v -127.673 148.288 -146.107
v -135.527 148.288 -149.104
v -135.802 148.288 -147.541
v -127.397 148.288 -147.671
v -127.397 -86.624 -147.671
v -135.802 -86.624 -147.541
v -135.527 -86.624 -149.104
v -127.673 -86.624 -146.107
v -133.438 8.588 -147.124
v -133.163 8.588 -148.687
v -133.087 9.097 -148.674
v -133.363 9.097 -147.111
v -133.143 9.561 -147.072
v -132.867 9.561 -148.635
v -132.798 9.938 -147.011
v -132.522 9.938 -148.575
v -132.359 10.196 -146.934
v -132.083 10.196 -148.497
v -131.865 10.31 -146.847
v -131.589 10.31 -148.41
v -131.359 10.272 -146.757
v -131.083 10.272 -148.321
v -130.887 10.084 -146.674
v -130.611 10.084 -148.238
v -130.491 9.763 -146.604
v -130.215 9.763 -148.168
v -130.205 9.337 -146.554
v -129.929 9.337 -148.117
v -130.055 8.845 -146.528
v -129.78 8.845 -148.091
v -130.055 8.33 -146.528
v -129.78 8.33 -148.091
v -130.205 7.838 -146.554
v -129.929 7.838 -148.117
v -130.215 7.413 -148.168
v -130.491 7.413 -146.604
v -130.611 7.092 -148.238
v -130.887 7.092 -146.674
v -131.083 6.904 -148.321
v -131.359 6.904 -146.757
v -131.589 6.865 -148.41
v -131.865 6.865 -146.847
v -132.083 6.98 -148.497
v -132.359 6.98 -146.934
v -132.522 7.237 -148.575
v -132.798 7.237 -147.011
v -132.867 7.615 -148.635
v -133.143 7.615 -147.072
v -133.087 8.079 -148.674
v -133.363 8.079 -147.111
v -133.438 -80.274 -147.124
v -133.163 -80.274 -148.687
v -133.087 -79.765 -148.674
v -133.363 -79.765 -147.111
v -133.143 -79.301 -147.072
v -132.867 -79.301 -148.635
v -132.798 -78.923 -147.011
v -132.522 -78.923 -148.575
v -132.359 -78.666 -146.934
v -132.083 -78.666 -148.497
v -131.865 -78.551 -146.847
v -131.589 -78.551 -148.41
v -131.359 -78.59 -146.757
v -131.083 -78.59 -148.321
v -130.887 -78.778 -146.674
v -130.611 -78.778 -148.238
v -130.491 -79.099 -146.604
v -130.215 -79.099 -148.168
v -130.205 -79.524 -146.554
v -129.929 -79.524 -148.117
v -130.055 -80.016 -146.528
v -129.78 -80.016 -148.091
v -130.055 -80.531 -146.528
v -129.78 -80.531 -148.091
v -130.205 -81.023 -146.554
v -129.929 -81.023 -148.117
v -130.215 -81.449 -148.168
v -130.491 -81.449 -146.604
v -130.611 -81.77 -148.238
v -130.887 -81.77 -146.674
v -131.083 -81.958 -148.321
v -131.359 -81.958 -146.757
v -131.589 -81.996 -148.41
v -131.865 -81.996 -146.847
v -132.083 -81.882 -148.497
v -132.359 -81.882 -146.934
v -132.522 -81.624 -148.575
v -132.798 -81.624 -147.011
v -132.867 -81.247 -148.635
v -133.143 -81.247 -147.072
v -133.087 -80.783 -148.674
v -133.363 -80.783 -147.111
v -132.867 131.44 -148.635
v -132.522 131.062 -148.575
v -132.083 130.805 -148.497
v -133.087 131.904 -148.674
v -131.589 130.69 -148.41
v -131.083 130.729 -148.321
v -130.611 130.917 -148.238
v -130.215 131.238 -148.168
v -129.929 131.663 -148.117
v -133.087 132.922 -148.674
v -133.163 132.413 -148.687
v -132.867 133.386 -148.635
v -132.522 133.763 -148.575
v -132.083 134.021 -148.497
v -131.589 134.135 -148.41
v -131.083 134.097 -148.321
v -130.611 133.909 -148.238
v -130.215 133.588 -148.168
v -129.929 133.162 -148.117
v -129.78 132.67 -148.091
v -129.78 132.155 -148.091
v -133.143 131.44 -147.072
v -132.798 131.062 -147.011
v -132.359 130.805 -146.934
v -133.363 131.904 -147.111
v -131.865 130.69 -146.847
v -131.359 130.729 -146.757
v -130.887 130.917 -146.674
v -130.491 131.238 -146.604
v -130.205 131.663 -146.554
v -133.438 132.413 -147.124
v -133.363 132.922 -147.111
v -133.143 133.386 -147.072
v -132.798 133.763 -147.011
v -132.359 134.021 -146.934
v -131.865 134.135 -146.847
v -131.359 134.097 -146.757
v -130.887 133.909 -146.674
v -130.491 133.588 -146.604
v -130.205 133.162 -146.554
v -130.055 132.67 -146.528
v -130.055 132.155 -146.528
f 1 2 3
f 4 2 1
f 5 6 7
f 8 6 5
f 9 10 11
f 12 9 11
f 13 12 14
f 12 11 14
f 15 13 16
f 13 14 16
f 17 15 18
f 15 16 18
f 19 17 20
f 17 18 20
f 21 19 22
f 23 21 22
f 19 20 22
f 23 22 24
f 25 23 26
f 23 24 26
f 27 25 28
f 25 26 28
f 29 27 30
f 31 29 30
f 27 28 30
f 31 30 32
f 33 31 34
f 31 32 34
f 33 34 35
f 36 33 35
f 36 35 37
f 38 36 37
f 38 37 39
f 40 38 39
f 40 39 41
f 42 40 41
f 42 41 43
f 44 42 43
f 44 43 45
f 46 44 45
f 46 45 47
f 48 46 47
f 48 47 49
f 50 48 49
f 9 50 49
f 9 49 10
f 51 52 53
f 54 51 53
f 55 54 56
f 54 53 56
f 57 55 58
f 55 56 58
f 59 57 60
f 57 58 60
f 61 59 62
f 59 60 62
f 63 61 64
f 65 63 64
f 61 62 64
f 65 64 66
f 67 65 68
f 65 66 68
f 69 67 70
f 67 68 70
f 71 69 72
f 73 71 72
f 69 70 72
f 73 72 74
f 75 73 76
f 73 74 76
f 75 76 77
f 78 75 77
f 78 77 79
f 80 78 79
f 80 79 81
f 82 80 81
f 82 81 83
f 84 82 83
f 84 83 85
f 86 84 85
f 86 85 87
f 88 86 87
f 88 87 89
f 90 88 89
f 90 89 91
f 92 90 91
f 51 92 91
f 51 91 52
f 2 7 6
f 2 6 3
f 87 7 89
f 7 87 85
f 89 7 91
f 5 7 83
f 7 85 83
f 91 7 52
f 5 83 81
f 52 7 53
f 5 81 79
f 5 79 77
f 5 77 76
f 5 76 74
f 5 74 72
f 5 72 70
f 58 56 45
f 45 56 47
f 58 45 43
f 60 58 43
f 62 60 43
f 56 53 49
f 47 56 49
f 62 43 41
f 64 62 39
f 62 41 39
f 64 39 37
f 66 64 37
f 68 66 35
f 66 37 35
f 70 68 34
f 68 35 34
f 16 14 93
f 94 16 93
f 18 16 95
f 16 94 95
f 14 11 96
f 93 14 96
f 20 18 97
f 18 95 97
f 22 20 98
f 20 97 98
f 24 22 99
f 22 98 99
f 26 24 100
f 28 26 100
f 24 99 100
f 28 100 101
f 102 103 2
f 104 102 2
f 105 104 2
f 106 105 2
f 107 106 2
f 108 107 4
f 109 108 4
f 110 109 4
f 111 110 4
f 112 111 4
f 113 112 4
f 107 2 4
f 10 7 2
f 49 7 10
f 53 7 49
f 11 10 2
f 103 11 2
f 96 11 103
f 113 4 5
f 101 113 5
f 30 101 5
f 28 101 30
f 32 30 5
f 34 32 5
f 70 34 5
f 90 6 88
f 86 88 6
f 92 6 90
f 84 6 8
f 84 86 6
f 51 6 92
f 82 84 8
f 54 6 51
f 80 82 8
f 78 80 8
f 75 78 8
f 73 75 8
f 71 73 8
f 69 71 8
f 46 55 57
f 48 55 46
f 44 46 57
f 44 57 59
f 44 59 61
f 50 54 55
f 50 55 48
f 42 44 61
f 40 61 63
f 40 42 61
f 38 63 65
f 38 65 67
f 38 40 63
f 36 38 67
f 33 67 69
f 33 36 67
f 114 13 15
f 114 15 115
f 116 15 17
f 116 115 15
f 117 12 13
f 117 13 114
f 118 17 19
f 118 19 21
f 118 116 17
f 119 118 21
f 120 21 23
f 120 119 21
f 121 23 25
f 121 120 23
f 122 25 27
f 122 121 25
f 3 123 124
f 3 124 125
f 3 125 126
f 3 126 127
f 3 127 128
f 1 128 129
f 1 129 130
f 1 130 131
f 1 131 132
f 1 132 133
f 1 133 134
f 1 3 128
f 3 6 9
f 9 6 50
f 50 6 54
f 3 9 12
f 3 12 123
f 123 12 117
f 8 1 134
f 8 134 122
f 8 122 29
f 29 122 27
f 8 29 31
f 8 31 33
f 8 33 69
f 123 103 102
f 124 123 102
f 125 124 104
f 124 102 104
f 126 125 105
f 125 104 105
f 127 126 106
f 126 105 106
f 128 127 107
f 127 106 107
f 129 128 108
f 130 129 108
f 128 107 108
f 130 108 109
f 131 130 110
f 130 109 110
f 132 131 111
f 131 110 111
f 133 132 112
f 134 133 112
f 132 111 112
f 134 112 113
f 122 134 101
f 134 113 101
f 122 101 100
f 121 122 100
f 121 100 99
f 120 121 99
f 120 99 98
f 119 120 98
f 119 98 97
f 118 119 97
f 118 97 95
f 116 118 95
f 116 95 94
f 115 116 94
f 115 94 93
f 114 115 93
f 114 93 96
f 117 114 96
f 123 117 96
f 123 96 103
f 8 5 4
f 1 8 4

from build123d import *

# Parameters (mm, degrees)
SKETCH1_W             = 8.255
SKETCH1_H             = 237.248411897
BOSS_EXTRUDE1_DEPTH   = 1.5875
CUT_EXTRUDE1_DEPTH    = 2.336885598
F_4_CLEARANCE_HOLE1_D = 3.4544


with BuildPart() as part:
    # Sketch1 → Boss-Extrude1 (new body)
    with BuildSketch(Plane(origin=(23.448725568, 0, -121.072657859), x_dir=(0.9848077530122085, 0, 0.17364817766692836), z_dir=(-0.17364817766692836, 0, 0.9848077530122085))):
        with Locations((-157.300223262, 29.663605247)):
            Rectangle(SKETCH1_W, SKETCH1_H)
    extrude(amount=BOSS_EXTRUDE1_DEPTH)

    # Sketch6 → Cut-Extrude1 (cut)
    with BuildSketch(Plane.XZ.offset(88.960600702)):
        Polygon((-135.526547851, -149.104287829), (-127.39695985, -147.670822122), (-127.672626332, -146.107439814), (-135.802214333, -147.540905521), align=None)
    extrude(amount=-CUT_EXTRUDE1_DEPTH, mode=Mode.SUBTRACT)

    # #4 Clearance Hole1 (through all)
    with Locations(Plane(origin=(21.136043007, 0, -119.868456446), x_dir=(0.9848077530122086, 0, 0.17364817766692783), z_dir=(-0.1736481776669278, 0, 0.9848077530122085))):
        with Locations((-155.231782926, -80.273715104), (-155.231782926, 132.412811195), (-155.231782926, 8.587811195)):
            Hole(F_4_CLEARANCE_HOLE1_D / 2)


solid = part.part
